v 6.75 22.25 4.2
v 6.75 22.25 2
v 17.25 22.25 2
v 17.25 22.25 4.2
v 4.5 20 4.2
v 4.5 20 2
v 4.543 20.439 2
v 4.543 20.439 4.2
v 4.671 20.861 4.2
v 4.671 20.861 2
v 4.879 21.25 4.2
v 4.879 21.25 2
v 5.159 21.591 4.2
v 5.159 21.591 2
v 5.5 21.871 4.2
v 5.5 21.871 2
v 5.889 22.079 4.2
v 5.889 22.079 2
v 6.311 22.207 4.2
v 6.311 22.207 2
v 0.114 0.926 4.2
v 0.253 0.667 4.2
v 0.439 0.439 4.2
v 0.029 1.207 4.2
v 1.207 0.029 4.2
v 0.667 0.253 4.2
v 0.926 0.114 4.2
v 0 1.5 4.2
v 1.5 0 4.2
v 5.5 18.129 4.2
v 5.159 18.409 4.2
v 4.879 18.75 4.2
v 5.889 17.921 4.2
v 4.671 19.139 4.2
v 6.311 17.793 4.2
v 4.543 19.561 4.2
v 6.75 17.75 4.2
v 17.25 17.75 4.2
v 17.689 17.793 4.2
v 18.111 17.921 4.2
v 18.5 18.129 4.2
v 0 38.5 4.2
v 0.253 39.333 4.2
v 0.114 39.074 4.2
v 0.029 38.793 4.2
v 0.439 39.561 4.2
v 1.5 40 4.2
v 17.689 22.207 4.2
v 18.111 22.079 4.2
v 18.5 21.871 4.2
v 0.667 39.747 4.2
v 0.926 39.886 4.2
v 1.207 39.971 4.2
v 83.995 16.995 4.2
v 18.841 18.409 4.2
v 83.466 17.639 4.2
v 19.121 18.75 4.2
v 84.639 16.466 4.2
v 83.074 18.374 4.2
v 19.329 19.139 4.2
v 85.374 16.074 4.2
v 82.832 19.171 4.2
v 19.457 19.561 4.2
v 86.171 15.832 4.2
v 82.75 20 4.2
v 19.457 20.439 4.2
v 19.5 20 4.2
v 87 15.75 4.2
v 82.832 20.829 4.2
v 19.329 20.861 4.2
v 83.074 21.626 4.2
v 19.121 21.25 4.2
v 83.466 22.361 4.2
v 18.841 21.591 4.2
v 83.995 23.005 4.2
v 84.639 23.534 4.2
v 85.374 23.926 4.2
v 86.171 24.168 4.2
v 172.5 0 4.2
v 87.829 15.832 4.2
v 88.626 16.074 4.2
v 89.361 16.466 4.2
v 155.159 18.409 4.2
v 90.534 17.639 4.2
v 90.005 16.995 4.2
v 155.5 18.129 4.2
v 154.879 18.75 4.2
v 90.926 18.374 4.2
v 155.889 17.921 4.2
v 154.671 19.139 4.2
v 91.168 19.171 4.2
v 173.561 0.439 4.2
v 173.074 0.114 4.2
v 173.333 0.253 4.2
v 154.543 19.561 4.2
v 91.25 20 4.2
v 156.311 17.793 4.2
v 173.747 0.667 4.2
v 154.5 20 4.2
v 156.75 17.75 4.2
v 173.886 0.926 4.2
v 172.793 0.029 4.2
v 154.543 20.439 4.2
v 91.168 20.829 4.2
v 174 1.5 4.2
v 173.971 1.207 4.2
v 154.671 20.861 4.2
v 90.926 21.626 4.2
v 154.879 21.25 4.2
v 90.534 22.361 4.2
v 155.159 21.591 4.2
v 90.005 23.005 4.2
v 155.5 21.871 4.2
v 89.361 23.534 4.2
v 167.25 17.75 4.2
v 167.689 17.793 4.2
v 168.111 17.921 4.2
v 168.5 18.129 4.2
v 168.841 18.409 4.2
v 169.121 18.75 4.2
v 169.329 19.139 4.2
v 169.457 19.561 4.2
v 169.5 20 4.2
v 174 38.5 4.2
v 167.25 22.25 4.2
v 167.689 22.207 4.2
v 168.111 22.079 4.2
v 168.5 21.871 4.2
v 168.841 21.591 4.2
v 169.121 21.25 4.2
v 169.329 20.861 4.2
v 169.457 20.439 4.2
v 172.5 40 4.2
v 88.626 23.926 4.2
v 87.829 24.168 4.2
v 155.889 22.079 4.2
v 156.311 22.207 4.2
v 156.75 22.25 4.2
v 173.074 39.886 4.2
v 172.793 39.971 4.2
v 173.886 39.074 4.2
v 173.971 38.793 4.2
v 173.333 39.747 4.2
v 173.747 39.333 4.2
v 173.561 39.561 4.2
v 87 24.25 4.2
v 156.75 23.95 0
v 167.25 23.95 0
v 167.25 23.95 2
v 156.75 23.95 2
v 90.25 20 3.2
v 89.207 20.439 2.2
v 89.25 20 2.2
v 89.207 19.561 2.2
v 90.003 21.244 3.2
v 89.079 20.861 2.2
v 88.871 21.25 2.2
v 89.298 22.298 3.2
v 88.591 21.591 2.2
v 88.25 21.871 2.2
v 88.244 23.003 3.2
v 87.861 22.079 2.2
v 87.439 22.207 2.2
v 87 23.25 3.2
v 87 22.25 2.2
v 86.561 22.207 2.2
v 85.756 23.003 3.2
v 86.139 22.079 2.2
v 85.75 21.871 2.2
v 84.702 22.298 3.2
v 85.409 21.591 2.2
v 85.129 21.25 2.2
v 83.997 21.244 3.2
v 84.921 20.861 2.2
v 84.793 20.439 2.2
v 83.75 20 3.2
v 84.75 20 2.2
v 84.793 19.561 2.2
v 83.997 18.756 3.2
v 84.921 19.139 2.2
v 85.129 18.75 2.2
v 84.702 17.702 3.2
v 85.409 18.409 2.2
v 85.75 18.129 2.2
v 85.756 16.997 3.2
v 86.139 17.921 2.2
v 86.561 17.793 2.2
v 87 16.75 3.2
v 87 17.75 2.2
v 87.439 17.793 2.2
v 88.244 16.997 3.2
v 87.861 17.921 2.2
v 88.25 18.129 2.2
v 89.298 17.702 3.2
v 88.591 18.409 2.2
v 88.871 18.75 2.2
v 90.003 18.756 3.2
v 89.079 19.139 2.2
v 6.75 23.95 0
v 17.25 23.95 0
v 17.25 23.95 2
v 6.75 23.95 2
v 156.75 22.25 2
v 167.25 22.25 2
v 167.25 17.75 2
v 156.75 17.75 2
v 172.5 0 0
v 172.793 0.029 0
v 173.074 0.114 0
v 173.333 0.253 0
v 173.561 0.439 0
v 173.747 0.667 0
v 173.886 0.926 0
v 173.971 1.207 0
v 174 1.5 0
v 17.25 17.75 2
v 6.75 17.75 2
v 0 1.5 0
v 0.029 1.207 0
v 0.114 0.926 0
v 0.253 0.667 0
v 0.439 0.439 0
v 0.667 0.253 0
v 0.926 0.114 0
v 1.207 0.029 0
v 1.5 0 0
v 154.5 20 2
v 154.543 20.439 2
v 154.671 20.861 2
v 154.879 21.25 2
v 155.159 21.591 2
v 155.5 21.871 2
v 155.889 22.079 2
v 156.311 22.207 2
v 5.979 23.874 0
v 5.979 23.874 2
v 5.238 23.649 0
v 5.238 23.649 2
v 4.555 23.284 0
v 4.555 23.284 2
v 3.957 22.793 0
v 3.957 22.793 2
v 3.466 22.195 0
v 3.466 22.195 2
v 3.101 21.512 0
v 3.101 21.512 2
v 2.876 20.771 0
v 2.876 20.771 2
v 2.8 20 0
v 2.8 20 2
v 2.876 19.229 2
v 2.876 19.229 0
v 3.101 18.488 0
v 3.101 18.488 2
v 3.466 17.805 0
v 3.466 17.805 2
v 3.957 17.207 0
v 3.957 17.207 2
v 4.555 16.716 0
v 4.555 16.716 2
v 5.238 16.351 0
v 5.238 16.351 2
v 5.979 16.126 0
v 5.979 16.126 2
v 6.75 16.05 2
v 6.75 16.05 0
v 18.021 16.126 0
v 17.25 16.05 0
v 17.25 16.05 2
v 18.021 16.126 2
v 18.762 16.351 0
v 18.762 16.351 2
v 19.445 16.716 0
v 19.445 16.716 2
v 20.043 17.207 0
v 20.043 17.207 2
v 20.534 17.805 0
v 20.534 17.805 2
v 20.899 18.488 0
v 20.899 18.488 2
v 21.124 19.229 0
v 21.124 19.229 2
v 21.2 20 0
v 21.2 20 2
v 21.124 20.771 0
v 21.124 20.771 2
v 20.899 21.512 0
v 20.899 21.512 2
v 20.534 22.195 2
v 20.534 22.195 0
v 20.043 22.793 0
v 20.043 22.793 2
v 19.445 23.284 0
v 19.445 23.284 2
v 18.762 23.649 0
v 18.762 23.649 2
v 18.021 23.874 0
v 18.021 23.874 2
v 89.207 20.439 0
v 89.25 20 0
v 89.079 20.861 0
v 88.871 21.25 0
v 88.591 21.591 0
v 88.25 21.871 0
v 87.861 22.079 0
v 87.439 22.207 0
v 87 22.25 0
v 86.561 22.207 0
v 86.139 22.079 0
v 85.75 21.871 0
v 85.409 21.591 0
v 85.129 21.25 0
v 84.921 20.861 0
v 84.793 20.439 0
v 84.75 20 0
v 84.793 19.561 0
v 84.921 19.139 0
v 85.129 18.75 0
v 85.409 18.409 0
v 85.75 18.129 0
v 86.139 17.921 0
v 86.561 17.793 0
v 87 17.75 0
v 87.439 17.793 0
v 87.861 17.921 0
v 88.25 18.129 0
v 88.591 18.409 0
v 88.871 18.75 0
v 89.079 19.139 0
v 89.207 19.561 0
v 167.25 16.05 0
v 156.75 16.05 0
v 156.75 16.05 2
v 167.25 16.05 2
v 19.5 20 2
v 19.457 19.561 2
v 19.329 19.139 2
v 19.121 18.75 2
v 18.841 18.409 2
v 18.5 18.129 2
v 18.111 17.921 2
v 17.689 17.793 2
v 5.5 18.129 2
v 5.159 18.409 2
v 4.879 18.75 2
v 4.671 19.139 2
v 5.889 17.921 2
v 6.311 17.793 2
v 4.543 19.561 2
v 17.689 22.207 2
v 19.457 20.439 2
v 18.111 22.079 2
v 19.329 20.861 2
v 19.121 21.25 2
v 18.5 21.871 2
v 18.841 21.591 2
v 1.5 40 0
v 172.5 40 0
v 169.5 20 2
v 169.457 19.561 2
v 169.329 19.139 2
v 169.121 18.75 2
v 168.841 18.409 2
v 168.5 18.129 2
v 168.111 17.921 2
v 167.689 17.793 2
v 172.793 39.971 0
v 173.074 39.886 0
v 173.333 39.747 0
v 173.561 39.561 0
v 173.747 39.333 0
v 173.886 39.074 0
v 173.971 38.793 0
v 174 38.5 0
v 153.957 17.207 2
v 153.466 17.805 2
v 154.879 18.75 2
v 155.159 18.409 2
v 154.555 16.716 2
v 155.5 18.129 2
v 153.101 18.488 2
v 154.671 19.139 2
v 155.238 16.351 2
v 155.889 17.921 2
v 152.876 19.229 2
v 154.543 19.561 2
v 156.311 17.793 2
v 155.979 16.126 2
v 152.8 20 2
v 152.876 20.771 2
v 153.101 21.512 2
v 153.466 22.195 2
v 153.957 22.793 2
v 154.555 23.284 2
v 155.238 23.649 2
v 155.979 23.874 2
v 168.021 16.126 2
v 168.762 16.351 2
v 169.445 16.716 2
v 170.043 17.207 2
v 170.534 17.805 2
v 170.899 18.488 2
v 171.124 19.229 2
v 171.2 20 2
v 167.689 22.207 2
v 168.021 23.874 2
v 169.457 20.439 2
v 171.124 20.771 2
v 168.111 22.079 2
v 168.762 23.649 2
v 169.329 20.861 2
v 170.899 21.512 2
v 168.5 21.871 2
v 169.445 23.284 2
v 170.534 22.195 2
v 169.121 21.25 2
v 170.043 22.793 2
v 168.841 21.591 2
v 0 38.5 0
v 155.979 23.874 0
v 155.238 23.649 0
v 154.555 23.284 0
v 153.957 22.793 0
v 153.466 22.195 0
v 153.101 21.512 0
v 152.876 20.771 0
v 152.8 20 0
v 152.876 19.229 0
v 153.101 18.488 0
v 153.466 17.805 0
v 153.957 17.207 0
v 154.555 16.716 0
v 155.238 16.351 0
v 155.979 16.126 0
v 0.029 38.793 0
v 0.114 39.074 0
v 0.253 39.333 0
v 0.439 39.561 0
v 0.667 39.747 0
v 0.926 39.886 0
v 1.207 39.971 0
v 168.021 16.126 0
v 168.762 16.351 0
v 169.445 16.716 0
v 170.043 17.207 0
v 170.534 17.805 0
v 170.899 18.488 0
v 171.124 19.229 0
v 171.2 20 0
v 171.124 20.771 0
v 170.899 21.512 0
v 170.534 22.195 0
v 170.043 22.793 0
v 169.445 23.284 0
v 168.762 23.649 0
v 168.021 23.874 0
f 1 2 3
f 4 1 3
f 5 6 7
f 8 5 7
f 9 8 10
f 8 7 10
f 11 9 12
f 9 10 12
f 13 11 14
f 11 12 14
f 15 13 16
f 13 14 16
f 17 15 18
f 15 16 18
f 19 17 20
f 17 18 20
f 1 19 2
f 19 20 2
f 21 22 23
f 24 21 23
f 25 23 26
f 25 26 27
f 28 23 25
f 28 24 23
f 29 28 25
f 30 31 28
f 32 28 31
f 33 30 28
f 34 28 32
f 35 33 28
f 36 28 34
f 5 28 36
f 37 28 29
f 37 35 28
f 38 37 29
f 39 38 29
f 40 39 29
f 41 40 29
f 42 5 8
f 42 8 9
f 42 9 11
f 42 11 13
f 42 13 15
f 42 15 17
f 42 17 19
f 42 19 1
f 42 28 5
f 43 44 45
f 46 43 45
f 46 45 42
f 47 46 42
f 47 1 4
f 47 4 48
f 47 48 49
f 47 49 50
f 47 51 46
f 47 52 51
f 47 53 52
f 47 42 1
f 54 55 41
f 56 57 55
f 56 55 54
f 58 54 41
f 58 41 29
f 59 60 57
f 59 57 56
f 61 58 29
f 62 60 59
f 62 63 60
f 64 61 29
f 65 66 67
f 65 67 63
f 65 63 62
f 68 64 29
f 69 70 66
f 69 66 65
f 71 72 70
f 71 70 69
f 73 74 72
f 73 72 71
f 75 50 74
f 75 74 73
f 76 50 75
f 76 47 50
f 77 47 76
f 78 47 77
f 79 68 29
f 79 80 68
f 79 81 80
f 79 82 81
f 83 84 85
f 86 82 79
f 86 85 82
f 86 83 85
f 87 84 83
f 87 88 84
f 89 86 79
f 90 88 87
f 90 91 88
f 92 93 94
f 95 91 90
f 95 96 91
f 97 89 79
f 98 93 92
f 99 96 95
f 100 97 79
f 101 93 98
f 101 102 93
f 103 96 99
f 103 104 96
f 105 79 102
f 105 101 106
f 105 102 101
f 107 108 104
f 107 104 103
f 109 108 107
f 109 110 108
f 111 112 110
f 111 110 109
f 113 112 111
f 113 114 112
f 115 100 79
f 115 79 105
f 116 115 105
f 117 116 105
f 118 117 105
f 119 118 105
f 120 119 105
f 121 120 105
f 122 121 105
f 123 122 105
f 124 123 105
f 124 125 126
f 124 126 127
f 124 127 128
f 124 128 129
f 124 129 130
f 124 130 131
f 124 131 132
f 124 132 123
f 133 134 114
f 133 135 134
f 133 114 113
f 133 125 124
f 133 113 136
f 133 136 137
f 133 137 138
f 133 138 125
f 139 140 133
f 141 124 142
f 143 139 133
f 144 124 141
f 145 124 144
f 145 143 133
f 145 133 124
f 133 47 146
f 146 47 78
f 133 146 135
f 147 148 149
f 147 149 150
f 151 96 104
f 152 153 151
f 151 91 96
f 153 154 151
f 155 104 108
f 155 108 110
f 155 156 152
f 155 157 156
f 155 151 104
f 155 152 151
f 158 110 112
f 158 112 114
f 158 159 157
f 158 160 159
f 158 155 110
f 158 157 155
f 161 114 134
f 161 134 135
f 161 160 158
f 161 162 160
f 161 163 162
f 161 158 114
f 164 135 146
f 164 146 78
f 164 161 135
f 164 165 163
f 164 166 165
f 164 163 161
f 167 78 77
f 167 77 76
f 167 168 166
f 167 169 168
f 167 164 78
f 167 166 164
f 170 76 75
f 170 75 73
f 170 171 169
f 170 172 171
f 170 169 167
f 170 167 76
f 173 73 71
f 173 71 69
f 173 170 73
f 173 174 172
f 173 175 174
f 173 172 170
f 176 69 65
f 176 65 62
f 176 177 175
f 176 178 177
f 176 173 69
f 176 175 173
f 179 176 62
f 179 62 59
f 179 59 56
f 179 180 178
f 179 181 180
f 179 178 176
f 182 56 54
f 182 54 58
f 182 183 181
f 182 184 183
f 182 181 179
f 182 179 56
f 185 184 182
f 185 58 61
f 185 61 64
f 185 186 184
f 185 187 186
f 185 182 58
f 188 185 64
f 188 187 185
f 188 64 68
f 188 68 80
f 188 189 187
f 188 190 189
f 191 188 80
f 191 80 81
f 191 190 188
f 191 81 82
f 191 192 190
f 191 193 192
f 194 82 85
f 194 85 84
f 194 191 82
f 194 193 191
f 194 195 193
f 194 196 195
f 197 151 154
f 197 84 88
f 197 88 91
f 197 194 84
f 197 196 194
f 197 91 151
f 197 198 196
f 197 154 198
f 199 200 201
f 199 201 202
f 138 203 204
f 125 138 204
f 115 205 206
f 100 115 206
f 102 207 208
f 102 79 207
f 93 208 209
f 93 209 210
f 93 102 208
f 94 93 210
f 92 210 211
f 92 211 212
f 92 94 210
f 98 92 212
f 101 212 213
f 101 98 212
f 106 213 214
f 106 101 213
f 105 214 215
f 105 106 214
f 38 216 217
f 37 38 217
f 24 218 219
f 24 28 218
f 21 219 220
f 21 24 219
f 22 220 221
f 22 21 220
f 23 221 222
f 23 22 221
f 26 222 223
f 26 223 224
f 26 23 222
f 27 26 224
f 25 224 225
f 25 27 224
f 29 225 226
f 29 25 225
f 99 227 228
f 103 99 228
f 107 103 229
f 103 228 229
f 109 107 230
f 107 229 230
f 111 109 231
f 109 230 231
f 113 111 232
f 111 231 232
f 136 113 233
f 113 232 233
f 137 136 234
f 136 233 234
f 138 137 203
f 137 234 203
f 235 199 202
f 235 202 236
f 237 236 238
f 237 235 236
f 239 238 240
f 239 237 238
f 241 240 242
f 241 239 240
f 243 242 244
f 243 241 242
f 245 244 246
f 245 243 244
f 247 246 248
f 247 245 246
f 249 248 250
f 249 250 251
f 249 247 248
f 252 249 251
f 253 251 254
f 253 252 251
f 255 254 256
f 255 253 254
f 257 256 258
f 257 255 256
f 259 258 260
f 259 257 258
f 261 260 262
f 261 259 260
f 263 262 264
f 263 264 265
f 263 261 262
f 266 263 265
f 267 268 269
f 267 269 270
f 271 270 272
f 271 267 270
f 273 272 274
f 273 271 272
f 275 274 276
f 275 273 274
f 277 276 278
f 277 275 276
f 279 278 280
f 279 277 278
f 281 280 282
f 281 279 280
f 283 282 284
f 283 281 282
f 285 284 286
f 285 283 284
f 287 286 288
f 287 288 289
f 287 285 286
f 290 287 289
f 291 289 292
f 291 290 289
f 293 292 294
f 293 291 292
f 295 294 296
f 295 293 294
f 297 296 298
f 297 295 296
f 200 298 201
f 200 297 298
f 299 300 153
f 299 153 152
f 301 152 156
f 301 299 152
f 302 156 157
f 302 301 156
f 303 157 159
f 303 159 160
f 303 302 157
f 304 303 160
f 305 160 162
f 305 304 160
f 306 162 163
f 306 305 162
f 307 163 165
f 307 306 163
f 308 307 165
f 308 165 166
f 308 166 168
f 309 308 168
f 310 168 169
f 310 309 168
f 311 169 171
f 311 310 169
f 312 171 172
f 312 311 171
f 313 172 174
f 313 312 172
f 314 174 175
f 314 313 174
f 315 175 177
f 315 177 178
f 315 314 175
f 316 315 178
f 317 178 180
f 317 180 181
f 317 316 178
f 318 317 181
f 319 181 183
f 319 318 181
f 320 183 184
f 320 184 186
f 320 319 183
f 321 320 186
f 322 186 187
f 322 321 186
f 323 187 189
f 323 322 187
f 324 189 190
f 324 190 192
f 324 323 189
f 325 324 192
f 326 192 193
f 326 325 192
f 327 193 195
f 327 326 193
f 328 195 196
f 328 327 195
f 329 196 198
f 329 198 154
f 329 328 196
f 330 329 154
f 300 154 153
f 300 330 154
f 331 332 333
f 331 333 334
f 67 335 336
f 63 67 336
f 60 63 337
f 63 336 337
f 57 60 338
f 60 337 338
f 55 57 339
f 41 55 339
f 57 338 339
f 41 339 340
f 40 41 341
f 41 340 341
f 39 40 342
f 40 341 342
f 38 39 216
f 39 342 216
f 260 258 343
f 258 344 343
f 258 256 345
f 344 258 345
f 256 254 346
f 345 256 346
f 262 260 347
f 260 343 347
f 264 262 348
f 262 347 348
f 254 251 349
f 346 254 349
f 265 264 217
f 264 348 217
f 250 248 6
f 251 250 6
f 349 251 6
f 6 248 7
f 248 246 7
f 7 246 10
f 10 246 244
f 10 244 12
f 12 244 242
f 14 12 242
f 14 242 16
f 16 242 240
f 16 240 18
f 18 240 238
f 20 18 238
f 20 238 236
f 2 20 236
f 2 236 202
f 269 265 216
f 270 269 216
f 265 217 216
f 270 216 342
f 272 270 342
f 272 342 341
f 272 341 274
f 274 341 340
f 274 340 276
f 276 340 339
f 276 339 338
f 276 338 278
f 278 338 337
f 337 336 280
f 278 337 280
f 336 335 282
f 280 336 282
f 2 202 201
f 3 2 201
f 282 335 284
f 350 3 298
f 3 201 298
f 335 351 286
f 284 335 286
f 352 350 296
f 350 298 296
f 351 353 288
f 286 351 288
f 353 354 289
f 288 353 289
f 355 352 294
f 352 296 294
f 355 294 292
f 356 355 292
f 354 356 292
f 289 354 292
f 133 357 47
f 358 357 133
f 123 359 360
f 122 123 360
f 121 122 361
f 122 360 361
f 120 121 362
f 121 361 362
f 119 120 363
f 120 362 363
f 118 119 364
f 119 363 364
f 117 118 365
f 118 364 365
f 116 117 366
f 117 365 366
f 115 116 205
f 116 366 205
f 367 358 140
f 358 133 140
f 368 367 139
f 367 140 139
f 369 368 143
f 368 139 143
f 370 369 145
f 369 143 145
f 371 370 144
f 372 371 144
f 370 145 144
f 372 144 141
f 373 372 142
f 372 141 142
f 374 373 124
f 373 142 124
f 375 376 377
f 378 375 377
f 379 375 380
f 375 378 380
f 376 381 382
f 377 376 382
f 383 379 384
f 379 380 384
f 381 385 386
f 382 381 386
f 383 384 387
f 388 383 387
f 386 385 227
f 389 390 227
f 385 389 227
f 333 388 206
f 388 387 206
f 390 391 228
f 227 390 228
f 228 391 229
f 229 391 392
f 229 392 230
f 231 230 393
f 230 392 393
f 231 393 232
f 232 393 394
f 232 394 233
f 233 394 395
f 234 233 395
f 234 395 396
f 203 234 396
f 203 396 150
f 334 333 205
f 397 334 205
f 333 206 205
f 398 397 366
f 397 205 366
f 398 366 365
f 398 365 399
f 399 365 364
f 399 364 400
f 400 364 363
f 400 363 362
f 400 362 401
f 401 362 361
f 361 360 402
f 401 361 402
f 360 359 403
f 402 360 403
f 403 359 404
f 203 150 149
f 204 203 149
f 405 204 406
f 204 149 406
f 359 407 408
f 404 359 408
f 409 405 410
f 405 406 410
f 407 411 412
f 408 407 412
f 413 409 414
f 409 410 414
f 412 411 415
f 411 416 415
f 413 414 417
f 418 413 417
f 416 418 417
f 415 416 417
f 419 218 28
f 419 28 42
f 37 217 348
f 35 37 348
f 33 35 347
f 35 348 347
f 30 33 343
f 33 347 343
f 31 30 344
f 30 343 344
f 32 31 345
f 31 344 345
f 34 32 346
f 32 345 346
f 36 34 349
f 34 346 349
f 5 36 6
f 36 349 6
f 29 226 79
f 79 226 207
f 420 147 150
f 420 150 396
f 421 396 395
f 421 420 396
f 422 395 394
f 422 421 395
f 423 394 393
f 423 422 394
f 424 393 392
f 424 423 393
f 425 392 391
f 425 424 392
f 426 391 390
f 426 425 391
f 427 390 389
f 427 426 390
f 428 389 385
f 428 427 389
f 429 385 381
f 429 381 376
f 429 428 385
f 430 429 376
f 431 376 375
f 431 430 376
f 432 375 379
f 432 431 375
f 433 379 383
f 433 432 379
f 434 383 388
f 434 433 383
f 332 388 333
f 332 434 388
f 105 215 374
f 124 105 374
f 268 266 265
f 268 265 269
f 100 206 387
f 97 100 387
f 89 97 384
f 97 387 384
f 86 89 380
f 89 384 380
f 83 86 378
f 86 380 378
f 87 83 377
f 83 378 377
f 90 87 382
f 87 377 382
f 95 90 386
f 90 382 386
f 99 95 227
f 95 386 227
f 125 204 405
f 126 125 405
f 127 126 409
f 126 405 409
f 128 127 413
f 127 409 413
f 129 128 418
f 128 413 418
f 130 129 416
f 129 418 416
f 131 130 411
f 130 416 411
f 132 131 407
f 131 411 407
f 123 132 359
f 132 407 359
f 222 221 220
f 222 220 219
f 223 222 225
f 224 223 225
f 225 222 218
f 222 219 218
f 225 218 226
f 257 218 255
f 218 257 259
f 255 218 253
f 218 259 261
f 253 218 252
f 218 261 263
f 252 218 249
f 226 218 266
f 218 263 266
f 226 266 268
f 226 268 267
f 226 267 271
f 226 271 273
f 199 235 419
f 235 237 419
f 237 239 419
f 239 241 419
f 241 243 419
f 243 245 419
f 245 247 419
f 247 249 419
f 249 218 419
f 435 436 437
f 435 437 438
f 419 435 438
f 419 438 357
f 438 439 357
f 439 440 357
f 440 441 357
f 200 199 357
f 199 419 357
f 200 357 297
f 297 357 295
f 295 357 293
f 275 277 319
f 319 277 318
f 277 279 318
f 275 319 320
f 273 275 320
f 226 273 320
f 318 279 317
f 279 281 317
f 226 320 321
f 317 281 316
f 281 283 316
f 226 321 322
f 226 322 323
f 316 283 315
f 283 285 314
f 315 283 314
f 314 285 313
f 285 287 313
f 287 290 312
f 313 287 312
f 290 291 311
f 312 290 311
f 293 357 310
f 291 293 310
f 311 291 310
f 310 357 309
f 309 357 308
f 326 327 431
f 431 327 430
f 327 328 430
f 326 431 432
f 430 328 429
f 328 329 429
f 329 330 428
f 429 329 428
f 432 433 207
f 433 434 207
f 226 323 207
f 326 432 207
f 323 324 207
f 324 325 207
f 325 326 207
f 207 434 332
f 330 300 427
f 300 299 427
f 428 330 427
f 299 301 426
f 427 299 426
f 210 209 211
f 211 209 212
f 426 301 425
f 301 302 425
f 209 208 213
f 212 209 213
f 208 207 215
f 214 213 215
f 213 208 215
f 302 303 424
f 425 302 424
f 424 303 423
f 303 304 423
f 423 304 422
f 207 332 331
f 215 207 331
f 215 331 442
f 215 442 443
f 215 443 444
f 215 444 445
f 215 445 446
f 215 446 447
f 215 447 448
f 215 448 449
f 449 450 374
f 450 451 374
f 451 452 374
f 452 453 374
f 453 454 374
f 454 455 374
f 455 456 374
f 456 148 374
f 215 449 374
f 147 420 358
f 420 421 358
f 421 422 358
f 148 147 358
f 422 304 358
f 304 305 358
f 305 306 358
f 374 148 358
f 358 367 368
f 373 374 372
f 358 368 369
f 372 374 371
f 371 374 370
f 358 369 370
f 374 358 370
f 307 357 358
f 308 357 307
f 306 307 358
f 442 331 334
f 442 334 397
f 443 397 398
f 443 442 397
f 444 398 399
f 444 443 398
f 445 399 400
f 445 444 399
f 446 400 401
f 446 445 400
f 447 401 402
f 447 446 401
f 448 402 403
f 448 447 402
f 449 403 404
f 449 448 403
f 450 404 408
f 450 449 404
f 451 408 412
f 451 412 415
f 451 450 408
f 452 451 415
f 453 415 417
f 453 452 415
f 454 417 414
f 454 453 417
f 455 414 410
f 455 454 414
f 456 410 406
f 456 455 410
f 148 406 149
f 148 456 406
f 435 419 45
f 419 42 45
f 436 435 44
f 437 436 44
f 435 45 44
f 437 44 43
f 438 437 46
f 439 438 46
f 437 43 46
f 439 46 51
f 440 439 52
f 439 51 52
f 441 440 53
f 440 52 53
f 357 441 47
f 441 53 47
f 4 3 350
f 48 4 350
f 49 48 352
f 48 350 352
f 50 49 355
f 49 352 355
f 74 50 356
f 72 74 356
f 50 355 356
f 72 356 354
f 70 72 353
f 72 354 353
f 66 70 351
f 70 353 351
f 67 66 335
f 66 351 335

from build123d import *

# Parameters (mm, degrees)
F0_W     = 174
F0_H     = 40
F0_R     = 2.25
F1_DEPTH = 4.2
F3_DEPTH = 2
F4_SIZE  = 2
F5_R     = 1.5


with BuildPart() as f1:
    # F0 (on Top) → F1 (new body)
    with BuildSketch(Plane.XY):
        with Locations((87, 20)):
            Rectangle(F0_W, F0_H)
        with BuildLine():
            ThreePointArc((4.5, 20), (5.15901, 21.59099), (6.75, 22.25))
            Line((6.75, 22.25), (17.25, 22.25))
            ThreePointArc((17.25, 22.25), (18.84099, 21.59099), (19.5, 20))
            ThreePointArc((19.5, 20), (18.84099, 18.40901), (17.25, 17.75))
            Line((17.25, 17.75), (6.75, 17.75))
            ThreePointArc((6.75, 17.75), (5.15901, 18.40901), (4.5, 20))
        make_face(mode=Mode.SUBTRACT)
        with Locations((87, 20)):
            Circle(F0_R, mode=Mode.SUBTRACT)
        with BuildLine():
            Line((156.75, 22.25), (167.25, 22.25))
            ThreePointArc((167.25, 22.25), (168.84099, 21.59099), (169.5, 20))
            ThreePointArc((169.5, 20), (168.84099, 18.40901), (167.25, 17.75))
            Line((167.25, 17.75), (156.75, 17.75))
            ThreePointArc((156.75, 17.75), (155.15901, 18.40901), (154.5, 20))
            ThreePointArc((154.5, 20), (155.15901, 21.59099), (156.75, 22.25))
        make_face(mode=Mode.SUBTRACT)
    extrude(amount=F1_DEPTH)

    # F2 (on Top) → F3 (cut)
    with BuildSketch(Plane.XY):
        with BuildLine():
            ThreePointArc((6.75, 23.95), (2.8, 20), (6.75, 16.05))
            Line((6.75, 16.05), (17.25, 16.05))
            ThreePointArc((17.25, 16.05), (21.2, 20), (17.25, 23.95))
            Line((17.25, 23.95), (6.75, 23.95))
        make_face()
        with BuildLine():
            Line((156.75, 16.05), (167.25, 16.05))
            ThreePointArc((167.25, 16.05), (171.2, 20), (167.25, 23.95))
            Line((167.25, 23.95), (156.75, 23.95))
            ThreePointArc((156.75, 23.95), (152.8, 20), (156.75, 16.05))
        make_face()
    extrude(amount=F3_DEPTH, mode=Mode.SUBTRACT)

    # F4
    f4_edges = [f1.edges().sort_by_distance(p)[0] for p in [
        (84.75, 20, 4.2),
    ]]
    chamfer(f4_edges, length=F4_SIZE)

    # F5
    f5_edges = [f1.edges().sort_by_distance(p)[0] for p in [
        (174, 0, 2.1),
        (174, 40, 2.1),
        (0, 40, 2.1),
        (0, 0, 2.1),
    ]]
    fillet(f5_edges, radius=F5_R)


solid = f1.part
